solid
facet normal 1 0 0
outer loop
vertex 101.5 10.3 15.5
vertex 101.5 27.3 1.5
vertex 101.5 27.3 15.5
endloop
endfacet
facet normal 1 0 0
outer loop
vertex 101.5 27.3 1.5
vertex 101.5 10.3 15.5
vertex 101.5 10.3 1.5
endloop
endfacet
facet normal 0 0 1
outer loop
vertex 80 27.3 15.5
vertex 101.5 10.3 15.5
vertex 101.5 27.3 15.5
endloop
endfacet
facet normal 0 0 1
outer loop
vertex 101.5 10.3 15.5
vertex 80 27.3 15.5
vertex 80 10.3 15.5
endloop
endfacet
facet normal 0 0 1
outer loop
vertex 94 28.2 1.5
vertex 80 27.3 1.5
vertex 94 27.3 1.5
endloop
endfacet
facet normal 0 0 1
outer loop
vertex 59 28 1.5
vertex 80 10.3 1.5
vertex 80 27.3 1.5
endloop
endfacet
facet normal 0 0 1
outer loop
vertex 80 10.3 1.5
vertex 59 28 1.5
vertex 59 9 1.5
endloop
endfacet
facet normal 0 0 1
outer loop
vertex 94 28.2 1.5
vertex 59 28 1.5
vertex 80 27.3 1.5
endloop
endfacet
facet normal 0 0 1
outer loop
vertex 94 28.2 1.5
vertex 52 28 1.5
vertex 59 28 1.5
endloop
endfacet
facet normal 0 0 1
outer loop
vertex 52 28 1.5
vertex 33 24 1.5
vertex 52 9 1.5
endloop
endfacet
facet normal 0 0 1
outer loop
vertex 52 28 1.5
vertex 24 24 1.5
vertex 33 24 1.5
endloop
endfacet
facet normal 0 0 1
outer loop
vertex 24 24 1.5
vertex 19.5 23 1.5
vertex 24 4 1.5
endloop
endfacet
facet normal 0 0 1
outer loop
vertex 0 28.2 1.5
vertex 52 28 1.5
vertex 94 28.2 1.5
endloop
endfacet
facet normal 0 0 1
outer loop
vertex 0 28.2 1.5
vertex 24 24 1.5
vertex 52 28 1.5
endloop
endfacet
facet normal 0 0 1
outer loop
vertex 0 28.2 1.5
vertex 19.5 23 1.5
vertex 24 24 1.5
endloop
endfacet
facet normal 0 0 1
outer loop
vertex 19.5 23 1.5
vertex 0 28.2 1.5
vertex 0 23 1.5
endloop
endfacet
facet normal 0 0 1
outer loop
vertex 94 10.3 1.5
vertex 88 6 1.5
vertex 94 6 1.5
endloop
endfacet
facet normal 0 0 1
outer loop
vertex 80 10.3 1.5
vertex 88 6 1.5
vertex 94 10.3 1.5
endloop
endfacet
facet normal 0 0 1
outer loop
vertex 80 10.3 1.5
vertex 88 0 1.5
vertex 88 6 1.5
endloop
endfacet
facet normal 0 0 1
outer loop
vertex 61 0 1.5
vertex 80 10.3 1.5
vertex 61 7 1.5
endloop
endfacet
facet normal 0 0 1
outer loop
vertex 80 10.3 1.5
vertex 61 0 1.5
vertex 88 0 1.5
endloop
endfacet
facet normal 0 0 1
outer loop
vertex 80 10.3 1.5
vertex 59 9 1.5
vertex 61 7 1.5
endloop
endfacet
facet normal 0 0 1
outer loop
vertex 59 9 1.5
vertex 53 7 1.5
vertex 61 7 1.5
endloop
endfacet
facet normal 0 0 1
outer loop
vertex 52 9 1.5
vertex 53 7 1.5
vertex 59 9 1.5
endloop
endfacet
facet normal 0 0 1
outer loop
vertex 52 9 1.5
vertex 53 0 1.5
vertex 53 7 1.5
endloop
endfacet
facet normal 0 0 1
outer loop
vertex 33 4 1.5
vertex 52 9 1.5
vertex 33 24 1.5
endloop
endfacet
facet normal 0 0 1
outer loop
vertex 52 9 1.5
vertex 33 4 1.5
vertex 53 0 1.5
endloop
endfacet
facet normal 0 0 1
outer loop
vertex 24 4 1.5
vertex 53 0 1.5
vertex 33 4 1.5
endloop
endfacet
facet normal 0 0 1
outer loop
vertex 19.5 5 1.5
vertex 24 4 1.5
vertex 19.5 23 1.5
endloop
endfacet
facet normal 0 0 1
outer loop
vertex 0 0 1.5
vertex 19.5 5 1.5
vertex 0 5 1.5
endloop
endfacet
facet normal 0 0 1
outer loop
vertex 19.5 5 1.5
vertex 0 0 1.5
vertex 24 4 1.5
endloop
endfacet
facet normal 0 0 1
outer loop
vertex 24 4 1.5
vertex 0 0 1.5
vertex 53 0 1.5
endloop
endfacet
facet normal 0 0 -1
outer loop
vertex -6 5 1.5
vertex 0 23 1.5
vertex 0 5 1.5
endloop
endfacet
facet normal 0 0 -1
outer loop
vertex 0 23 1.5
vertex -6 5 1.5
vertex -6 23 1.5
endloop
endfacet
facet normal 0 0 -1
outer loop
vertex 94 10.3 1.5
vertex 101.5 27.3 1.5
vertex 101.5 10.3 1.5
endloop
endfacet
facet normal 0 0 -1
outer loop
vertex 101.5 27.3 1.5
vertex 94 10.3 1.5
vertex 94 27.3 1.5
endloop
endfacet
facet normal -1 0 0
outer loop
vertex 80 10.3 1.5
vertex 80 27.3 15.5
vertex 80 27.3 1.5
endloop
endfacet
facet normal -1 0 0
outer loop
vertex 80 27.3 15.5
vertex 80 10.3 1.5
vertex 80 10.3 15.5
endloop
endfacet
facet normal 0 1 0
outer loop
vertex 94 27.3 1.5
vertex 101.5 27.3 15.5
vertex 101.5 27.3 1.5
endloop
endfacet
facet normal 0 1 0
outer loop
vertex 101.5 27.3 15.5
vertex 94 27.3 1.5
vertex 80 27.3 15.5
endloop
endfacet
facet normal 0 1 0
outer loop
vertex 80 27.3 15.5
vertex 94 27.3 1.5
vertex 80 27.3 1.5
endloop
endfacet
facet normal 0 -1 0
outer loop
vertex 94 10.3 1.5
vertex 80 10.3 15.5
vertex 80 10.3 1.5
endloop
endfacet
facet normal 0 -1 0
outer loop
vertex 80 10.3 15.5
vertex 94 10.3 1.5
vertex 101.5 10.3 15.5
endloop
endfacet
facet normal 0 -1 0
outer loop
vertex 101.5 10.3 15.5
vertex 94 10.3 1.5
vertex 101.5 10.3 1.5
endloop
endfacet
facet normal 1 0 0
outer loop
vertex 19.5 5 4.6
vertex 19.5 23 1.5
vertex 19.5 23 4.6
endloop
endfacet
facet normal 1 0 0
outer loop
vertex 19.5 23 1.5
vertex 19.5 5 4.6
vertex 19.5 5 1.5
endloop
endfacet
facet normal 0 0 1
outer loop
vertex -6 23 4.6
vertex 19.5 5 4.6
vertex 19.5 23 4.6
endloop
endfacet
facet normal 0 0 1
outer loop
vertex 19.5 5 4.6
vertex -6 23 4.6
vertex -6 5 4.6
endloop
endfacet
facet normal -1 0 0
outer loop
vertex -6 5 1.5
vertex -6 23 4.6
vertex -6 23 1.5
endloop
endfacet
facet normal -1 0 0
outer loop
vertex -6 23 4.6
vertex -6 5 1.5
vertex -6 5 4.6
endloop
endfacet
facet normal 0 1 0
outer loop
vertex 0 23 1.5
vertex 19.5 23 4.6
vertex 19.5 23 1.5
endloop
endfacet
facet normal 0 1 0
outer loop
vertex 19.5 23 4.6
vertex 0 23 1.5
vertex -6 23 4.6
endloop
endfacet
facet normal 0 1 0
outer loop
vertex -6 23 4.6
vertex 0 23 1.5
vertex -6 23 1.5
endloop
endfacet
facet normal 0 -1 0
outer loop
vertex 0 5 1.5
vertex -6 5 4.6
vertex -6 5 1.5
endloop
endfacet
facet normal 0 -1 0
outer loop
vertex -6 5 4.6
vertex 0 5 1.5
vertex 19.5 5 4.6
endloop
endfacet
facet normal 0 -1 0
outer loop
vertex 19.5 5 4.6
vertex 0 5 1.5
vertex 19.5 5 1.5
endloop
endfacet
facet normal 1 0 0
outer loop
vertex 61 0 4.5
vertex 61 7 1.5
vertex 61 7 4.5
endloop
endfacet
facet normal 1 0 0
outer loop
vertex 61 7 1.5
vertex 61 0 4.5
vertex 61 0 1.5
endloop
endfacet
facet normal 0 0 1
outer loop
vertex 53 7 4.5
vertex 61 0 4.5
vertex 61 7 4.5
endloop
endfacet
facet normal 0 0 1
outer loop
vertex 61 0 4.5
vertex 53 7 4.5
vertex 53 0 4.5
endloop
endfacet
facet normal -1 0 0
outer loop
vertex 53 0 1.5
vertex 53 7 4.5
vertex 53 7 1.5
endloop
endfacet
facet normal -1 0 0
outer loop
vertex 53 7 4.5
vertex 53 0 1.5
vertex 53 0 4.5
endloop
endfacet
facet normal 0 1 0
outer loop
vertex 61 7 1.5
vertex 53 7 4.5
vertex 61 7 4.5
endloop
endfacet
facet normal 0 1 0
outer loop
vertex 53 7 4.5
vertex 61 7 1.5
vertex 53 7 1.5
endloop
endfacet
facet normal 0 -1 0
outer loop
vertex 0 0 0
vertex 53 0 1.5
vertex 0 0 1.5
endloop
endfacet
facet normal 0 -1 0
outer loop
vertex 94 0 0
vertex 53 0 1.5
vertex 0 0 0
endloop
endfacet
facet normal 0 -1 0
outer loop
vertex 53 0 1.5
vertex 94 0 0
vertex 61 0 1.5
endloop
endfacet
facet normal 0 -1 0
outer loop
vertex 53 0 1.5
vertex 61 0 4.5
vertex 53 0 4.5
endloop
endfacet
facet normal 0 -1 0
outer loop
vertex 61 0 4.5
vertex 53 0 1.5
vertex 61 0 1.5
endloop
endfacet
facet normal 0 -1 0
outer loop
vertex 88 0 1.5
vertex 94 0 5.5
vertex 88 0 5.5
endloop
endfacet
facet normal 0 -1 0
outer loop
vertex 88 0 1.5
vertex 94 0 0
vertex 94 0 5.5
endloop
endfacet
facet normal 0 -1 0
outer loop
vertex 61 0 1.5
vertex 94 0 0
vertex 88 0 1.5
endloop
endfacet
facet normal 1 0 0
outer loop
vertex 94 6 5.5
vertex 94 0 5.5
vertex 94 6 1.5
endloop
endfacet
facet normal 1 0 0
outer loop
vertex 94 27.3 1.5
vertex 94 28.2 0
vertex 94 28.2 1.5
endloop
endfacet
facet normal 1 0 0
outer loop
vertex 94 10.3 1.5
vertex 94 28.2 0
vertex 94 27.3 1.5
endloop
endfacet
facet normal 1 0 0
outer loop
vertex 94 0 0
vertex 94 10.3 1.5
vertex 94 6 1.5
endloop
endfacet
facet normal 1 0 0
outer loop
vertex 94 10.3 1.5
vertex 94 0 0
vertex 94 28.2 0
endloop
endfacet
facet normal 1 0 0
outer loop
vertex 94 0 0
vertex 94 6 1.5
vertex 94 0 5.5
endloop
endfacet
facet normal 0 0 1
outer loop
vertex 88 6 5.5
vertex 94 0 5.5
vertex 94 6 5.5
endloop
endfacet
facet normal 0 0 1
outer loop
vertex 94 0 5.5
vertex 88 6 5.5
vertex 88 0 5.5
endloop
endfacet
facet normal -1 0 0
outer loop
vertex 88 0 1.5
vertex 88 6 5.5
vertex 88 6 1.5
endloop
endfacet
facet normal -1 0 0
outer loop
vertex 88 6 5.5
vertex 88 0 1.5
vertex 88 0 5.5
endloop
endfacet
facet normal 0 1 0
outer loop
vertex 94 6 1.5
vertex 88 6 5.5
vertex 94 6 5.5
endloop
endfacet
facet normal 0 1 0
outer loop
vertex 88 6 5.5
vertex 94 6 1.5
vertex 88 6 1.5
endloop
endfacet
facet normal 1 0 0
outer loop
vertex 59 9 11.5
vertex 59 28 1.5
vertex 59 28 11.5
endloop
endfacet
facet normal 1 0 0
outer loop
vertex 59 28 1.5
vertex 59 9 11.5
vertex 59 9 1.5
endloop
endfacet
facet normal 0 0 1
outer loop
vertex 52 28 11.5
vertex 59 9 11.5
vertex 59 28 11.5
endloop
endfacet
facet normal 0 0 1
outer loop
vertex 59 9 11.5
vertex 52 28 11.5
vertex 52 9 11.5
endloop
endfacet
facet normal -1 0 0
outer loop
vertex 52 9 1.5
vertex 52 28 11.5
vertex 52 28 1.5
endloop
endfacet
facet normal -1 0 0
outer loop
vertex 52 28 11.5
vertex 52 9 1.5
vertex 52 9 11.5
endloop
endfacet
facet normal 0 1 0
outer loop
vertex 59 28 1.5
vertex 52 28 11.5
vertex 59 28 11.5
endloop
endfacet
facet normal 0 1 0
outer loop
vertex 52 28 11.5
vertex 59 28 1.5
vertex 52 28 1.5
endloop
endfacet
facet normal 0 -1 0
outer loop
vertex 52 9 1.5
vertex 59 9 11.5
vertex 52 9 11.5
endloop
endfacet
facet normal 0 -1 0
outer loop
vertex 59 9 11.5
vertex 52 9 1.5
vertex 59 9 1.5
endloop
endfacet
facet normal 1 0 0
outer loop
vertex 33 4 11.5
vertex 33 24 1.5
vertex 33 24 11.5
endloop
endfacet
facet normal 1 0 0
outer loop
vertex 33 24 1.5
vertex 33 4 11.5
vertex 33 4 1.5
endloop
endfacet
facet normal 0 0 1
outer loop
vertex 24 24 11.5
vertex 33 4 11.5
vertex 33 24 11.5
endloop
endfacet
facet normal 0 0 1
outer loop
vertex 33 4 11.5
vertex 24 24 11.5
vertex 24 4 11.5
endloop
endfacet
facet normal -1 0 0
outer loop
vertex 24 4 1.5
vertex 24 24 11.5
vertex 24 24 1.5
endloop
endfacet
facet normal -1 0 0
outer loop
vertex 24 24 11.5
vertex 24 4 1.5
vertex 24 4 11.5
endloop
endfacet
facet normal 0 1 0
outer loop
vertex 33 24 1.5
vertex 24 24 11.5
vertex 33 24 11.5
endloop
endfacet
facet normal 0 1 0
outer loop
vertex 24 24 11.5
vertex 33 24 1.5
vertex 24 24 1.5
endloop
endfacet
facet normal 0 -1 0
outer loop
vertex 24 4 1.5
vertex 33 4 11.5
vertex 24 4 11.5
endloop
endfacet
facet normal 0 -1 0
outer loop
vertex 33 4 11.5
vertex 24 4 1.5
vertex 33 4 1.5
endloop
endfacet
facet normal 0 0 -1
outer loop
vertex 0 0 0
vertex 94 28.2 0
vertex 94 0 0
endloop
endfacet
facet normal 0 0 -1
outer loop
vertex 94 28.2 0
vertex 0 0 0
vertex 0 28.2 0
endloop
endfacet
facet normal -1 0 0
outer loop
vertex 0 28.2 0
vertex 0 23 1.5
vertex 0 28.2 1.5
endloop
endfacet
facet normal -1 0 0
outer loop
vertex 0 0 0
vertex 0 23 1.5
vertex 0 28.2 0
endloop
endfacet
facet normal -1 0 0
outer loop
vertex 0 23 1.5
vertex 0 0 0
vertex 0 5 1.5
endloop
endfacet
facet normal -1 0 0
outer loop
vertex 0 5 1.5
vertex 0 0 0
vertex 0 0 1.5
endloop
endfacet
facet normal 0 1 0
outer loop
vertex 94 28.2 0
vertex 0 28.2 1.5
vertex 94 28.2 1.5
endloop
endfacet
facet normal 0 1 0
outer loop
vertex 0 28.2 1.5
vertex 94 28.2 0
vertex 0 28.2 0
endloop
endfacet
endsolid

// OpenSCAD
// Author    KMS - Martin Dubois, P.Eng
// Copyright (C) 2021 KMS
// Product   EthCAN
// File      Hardware/ESP-32-POE-ISO.scad

ESP_32_POE_ISO();

// Public
/////////////////////////////////////////////////////////////////////////////

module ESP_32_POE_ISO()
{
    color( "red" )
    {
        cube( [ SIZE_X, SIZE_Y, TICK ] );

        translate( [ 0, 0, TICK ] )
        {
            translate( [ ETH_X, ETH_Y, 0 ] )
                cube( [ ETH_SIZE_X, ETH_SIZE_Y, ETH_SIZE_Z ] );

            translate( [ ESP_X, 5, 0 ] )
                cube( [ 25.5, 18, 3.1 ] );

            translate( [ USB_X, 0, 0 ] )
                cube( [ 8, 7, 3 ] );

            translate( [ POWER_X, 0, 0 ] )
                cube( [ 6, 6, 4 ] );

            translate( [ BOX_X, 9, 0 ] )
                cube( [ 7, 19, 10 ] );

            // Connector
            translate( [ 24, 4, 0 ] )
                cube( [ 9, 20, 10 ] );
        }
    }
}

module ESP_32_POE_ISO_Bottom()
{
    translate( [ - SPACE, - SPACE, 0 ] )
        cube( [ 2 * SPACE + SIZE_X, 2 * SPACE + SIZE_Y, 19 ] ); // 1 + EPS ] );

    translate( [ 1, 1, - 3 ] )
        cube( [ SIZE_X - 2, SIZE_Y - 2, 19 ] ); // 3 + EPS ] );

    translate( [ ETH_X, ETH_Y - SPACE, TICK - SPACE ] )
        cube( [ ETH_SIZE_X + EPS, 2 * SPACE + ETH_SIZE_Y, 19 ] ); // 2 * SPACE + ETH_SIZE_Z ] );

    // Back components

    translate( [ 0, 0, - 3 ] )
    {
        translate( [ 5, 0, 0 ] )
        cube( [ 5, 1 + EPS, 3 + EPS ] );

        translate( [ SIZE_X - 8, 0, 0 ] )
            cube( [ 4, 1 + EPS, 3 + EPS ] );

        translate( [ 58, SIZE_Y - 1 - EPS, 0 ] )
            cube( [ SIZE_X - 58 - 3, 1 + EPS, 3 + EPS ] );
    }
}

module ESP_32_POE_ISO_Top()
{
    translate( [ ESP_X, - SPACE, 0 ] )
        cube( [ 6 + SIZE_X + 4, 2 * SPACE + SIZE_Y, TICK ] );

    translate( [ ESP_X, 1, TICK - EPS ] )
        cube( [ 6 + EPS, SIZE_Y - 2, 13 ] );

    translate( [ 0, 1, TICK - EPS ] )
        cube( [ SIZE_X - 1, SIZE_Y - 2, 17 ] );

    translate( [ ESP_X - 1, 4, 0 ] )
        cube( [ 25.5, 20, TICK + 9 ] );

    translate( [ ETH_X, ETH_Y - SPACE, 0 ] )
        cube( [ ETH_SIZE_X + EPS, 2 * SPACE + ETH_SIZE_Y, TICK + ETH_SIZE_Z + SPACE ] );

    translate( [ USB_X - 1, - 1, 0 ] )
        cube( [ 36, 9, TICK + 4 ] );

    translate( [ POWER_X - 1, - 1, 0 ] )
        cube( [ 8, 12, TICK + 14 ] );

    translate( [ BOX_X - 1, 8, 0 ] )
        cube( [ 28, 21, TICK + 17 ] );

    for ( y = [ 0, SIZE_Y - 1 - EPS ] )
    {
        translate( [ 3, y, TICK - EPS ] )
            cube( [ 10, 1 + EPS, 10 ] );
    }

}

// Private
/////////////////////////////////////////////////////////////////////////////

EPS = 0.1;

SIZE_X = 94;
SIZE_Y = 28.2;

BOX_X = 52;

ESP_X = - 6;

ETH_SIZE_X = 21.5;
ETH_SIZE_Y = 17;
ETH_SIZE_Z = 14;

ETH_X = SIZE_X - 14;
ETH_Y =          10.3;

POWER_X = SIZE_X - 6;

USB_X = 53;

SPACE = 0.1;

TICK = 1.5;
